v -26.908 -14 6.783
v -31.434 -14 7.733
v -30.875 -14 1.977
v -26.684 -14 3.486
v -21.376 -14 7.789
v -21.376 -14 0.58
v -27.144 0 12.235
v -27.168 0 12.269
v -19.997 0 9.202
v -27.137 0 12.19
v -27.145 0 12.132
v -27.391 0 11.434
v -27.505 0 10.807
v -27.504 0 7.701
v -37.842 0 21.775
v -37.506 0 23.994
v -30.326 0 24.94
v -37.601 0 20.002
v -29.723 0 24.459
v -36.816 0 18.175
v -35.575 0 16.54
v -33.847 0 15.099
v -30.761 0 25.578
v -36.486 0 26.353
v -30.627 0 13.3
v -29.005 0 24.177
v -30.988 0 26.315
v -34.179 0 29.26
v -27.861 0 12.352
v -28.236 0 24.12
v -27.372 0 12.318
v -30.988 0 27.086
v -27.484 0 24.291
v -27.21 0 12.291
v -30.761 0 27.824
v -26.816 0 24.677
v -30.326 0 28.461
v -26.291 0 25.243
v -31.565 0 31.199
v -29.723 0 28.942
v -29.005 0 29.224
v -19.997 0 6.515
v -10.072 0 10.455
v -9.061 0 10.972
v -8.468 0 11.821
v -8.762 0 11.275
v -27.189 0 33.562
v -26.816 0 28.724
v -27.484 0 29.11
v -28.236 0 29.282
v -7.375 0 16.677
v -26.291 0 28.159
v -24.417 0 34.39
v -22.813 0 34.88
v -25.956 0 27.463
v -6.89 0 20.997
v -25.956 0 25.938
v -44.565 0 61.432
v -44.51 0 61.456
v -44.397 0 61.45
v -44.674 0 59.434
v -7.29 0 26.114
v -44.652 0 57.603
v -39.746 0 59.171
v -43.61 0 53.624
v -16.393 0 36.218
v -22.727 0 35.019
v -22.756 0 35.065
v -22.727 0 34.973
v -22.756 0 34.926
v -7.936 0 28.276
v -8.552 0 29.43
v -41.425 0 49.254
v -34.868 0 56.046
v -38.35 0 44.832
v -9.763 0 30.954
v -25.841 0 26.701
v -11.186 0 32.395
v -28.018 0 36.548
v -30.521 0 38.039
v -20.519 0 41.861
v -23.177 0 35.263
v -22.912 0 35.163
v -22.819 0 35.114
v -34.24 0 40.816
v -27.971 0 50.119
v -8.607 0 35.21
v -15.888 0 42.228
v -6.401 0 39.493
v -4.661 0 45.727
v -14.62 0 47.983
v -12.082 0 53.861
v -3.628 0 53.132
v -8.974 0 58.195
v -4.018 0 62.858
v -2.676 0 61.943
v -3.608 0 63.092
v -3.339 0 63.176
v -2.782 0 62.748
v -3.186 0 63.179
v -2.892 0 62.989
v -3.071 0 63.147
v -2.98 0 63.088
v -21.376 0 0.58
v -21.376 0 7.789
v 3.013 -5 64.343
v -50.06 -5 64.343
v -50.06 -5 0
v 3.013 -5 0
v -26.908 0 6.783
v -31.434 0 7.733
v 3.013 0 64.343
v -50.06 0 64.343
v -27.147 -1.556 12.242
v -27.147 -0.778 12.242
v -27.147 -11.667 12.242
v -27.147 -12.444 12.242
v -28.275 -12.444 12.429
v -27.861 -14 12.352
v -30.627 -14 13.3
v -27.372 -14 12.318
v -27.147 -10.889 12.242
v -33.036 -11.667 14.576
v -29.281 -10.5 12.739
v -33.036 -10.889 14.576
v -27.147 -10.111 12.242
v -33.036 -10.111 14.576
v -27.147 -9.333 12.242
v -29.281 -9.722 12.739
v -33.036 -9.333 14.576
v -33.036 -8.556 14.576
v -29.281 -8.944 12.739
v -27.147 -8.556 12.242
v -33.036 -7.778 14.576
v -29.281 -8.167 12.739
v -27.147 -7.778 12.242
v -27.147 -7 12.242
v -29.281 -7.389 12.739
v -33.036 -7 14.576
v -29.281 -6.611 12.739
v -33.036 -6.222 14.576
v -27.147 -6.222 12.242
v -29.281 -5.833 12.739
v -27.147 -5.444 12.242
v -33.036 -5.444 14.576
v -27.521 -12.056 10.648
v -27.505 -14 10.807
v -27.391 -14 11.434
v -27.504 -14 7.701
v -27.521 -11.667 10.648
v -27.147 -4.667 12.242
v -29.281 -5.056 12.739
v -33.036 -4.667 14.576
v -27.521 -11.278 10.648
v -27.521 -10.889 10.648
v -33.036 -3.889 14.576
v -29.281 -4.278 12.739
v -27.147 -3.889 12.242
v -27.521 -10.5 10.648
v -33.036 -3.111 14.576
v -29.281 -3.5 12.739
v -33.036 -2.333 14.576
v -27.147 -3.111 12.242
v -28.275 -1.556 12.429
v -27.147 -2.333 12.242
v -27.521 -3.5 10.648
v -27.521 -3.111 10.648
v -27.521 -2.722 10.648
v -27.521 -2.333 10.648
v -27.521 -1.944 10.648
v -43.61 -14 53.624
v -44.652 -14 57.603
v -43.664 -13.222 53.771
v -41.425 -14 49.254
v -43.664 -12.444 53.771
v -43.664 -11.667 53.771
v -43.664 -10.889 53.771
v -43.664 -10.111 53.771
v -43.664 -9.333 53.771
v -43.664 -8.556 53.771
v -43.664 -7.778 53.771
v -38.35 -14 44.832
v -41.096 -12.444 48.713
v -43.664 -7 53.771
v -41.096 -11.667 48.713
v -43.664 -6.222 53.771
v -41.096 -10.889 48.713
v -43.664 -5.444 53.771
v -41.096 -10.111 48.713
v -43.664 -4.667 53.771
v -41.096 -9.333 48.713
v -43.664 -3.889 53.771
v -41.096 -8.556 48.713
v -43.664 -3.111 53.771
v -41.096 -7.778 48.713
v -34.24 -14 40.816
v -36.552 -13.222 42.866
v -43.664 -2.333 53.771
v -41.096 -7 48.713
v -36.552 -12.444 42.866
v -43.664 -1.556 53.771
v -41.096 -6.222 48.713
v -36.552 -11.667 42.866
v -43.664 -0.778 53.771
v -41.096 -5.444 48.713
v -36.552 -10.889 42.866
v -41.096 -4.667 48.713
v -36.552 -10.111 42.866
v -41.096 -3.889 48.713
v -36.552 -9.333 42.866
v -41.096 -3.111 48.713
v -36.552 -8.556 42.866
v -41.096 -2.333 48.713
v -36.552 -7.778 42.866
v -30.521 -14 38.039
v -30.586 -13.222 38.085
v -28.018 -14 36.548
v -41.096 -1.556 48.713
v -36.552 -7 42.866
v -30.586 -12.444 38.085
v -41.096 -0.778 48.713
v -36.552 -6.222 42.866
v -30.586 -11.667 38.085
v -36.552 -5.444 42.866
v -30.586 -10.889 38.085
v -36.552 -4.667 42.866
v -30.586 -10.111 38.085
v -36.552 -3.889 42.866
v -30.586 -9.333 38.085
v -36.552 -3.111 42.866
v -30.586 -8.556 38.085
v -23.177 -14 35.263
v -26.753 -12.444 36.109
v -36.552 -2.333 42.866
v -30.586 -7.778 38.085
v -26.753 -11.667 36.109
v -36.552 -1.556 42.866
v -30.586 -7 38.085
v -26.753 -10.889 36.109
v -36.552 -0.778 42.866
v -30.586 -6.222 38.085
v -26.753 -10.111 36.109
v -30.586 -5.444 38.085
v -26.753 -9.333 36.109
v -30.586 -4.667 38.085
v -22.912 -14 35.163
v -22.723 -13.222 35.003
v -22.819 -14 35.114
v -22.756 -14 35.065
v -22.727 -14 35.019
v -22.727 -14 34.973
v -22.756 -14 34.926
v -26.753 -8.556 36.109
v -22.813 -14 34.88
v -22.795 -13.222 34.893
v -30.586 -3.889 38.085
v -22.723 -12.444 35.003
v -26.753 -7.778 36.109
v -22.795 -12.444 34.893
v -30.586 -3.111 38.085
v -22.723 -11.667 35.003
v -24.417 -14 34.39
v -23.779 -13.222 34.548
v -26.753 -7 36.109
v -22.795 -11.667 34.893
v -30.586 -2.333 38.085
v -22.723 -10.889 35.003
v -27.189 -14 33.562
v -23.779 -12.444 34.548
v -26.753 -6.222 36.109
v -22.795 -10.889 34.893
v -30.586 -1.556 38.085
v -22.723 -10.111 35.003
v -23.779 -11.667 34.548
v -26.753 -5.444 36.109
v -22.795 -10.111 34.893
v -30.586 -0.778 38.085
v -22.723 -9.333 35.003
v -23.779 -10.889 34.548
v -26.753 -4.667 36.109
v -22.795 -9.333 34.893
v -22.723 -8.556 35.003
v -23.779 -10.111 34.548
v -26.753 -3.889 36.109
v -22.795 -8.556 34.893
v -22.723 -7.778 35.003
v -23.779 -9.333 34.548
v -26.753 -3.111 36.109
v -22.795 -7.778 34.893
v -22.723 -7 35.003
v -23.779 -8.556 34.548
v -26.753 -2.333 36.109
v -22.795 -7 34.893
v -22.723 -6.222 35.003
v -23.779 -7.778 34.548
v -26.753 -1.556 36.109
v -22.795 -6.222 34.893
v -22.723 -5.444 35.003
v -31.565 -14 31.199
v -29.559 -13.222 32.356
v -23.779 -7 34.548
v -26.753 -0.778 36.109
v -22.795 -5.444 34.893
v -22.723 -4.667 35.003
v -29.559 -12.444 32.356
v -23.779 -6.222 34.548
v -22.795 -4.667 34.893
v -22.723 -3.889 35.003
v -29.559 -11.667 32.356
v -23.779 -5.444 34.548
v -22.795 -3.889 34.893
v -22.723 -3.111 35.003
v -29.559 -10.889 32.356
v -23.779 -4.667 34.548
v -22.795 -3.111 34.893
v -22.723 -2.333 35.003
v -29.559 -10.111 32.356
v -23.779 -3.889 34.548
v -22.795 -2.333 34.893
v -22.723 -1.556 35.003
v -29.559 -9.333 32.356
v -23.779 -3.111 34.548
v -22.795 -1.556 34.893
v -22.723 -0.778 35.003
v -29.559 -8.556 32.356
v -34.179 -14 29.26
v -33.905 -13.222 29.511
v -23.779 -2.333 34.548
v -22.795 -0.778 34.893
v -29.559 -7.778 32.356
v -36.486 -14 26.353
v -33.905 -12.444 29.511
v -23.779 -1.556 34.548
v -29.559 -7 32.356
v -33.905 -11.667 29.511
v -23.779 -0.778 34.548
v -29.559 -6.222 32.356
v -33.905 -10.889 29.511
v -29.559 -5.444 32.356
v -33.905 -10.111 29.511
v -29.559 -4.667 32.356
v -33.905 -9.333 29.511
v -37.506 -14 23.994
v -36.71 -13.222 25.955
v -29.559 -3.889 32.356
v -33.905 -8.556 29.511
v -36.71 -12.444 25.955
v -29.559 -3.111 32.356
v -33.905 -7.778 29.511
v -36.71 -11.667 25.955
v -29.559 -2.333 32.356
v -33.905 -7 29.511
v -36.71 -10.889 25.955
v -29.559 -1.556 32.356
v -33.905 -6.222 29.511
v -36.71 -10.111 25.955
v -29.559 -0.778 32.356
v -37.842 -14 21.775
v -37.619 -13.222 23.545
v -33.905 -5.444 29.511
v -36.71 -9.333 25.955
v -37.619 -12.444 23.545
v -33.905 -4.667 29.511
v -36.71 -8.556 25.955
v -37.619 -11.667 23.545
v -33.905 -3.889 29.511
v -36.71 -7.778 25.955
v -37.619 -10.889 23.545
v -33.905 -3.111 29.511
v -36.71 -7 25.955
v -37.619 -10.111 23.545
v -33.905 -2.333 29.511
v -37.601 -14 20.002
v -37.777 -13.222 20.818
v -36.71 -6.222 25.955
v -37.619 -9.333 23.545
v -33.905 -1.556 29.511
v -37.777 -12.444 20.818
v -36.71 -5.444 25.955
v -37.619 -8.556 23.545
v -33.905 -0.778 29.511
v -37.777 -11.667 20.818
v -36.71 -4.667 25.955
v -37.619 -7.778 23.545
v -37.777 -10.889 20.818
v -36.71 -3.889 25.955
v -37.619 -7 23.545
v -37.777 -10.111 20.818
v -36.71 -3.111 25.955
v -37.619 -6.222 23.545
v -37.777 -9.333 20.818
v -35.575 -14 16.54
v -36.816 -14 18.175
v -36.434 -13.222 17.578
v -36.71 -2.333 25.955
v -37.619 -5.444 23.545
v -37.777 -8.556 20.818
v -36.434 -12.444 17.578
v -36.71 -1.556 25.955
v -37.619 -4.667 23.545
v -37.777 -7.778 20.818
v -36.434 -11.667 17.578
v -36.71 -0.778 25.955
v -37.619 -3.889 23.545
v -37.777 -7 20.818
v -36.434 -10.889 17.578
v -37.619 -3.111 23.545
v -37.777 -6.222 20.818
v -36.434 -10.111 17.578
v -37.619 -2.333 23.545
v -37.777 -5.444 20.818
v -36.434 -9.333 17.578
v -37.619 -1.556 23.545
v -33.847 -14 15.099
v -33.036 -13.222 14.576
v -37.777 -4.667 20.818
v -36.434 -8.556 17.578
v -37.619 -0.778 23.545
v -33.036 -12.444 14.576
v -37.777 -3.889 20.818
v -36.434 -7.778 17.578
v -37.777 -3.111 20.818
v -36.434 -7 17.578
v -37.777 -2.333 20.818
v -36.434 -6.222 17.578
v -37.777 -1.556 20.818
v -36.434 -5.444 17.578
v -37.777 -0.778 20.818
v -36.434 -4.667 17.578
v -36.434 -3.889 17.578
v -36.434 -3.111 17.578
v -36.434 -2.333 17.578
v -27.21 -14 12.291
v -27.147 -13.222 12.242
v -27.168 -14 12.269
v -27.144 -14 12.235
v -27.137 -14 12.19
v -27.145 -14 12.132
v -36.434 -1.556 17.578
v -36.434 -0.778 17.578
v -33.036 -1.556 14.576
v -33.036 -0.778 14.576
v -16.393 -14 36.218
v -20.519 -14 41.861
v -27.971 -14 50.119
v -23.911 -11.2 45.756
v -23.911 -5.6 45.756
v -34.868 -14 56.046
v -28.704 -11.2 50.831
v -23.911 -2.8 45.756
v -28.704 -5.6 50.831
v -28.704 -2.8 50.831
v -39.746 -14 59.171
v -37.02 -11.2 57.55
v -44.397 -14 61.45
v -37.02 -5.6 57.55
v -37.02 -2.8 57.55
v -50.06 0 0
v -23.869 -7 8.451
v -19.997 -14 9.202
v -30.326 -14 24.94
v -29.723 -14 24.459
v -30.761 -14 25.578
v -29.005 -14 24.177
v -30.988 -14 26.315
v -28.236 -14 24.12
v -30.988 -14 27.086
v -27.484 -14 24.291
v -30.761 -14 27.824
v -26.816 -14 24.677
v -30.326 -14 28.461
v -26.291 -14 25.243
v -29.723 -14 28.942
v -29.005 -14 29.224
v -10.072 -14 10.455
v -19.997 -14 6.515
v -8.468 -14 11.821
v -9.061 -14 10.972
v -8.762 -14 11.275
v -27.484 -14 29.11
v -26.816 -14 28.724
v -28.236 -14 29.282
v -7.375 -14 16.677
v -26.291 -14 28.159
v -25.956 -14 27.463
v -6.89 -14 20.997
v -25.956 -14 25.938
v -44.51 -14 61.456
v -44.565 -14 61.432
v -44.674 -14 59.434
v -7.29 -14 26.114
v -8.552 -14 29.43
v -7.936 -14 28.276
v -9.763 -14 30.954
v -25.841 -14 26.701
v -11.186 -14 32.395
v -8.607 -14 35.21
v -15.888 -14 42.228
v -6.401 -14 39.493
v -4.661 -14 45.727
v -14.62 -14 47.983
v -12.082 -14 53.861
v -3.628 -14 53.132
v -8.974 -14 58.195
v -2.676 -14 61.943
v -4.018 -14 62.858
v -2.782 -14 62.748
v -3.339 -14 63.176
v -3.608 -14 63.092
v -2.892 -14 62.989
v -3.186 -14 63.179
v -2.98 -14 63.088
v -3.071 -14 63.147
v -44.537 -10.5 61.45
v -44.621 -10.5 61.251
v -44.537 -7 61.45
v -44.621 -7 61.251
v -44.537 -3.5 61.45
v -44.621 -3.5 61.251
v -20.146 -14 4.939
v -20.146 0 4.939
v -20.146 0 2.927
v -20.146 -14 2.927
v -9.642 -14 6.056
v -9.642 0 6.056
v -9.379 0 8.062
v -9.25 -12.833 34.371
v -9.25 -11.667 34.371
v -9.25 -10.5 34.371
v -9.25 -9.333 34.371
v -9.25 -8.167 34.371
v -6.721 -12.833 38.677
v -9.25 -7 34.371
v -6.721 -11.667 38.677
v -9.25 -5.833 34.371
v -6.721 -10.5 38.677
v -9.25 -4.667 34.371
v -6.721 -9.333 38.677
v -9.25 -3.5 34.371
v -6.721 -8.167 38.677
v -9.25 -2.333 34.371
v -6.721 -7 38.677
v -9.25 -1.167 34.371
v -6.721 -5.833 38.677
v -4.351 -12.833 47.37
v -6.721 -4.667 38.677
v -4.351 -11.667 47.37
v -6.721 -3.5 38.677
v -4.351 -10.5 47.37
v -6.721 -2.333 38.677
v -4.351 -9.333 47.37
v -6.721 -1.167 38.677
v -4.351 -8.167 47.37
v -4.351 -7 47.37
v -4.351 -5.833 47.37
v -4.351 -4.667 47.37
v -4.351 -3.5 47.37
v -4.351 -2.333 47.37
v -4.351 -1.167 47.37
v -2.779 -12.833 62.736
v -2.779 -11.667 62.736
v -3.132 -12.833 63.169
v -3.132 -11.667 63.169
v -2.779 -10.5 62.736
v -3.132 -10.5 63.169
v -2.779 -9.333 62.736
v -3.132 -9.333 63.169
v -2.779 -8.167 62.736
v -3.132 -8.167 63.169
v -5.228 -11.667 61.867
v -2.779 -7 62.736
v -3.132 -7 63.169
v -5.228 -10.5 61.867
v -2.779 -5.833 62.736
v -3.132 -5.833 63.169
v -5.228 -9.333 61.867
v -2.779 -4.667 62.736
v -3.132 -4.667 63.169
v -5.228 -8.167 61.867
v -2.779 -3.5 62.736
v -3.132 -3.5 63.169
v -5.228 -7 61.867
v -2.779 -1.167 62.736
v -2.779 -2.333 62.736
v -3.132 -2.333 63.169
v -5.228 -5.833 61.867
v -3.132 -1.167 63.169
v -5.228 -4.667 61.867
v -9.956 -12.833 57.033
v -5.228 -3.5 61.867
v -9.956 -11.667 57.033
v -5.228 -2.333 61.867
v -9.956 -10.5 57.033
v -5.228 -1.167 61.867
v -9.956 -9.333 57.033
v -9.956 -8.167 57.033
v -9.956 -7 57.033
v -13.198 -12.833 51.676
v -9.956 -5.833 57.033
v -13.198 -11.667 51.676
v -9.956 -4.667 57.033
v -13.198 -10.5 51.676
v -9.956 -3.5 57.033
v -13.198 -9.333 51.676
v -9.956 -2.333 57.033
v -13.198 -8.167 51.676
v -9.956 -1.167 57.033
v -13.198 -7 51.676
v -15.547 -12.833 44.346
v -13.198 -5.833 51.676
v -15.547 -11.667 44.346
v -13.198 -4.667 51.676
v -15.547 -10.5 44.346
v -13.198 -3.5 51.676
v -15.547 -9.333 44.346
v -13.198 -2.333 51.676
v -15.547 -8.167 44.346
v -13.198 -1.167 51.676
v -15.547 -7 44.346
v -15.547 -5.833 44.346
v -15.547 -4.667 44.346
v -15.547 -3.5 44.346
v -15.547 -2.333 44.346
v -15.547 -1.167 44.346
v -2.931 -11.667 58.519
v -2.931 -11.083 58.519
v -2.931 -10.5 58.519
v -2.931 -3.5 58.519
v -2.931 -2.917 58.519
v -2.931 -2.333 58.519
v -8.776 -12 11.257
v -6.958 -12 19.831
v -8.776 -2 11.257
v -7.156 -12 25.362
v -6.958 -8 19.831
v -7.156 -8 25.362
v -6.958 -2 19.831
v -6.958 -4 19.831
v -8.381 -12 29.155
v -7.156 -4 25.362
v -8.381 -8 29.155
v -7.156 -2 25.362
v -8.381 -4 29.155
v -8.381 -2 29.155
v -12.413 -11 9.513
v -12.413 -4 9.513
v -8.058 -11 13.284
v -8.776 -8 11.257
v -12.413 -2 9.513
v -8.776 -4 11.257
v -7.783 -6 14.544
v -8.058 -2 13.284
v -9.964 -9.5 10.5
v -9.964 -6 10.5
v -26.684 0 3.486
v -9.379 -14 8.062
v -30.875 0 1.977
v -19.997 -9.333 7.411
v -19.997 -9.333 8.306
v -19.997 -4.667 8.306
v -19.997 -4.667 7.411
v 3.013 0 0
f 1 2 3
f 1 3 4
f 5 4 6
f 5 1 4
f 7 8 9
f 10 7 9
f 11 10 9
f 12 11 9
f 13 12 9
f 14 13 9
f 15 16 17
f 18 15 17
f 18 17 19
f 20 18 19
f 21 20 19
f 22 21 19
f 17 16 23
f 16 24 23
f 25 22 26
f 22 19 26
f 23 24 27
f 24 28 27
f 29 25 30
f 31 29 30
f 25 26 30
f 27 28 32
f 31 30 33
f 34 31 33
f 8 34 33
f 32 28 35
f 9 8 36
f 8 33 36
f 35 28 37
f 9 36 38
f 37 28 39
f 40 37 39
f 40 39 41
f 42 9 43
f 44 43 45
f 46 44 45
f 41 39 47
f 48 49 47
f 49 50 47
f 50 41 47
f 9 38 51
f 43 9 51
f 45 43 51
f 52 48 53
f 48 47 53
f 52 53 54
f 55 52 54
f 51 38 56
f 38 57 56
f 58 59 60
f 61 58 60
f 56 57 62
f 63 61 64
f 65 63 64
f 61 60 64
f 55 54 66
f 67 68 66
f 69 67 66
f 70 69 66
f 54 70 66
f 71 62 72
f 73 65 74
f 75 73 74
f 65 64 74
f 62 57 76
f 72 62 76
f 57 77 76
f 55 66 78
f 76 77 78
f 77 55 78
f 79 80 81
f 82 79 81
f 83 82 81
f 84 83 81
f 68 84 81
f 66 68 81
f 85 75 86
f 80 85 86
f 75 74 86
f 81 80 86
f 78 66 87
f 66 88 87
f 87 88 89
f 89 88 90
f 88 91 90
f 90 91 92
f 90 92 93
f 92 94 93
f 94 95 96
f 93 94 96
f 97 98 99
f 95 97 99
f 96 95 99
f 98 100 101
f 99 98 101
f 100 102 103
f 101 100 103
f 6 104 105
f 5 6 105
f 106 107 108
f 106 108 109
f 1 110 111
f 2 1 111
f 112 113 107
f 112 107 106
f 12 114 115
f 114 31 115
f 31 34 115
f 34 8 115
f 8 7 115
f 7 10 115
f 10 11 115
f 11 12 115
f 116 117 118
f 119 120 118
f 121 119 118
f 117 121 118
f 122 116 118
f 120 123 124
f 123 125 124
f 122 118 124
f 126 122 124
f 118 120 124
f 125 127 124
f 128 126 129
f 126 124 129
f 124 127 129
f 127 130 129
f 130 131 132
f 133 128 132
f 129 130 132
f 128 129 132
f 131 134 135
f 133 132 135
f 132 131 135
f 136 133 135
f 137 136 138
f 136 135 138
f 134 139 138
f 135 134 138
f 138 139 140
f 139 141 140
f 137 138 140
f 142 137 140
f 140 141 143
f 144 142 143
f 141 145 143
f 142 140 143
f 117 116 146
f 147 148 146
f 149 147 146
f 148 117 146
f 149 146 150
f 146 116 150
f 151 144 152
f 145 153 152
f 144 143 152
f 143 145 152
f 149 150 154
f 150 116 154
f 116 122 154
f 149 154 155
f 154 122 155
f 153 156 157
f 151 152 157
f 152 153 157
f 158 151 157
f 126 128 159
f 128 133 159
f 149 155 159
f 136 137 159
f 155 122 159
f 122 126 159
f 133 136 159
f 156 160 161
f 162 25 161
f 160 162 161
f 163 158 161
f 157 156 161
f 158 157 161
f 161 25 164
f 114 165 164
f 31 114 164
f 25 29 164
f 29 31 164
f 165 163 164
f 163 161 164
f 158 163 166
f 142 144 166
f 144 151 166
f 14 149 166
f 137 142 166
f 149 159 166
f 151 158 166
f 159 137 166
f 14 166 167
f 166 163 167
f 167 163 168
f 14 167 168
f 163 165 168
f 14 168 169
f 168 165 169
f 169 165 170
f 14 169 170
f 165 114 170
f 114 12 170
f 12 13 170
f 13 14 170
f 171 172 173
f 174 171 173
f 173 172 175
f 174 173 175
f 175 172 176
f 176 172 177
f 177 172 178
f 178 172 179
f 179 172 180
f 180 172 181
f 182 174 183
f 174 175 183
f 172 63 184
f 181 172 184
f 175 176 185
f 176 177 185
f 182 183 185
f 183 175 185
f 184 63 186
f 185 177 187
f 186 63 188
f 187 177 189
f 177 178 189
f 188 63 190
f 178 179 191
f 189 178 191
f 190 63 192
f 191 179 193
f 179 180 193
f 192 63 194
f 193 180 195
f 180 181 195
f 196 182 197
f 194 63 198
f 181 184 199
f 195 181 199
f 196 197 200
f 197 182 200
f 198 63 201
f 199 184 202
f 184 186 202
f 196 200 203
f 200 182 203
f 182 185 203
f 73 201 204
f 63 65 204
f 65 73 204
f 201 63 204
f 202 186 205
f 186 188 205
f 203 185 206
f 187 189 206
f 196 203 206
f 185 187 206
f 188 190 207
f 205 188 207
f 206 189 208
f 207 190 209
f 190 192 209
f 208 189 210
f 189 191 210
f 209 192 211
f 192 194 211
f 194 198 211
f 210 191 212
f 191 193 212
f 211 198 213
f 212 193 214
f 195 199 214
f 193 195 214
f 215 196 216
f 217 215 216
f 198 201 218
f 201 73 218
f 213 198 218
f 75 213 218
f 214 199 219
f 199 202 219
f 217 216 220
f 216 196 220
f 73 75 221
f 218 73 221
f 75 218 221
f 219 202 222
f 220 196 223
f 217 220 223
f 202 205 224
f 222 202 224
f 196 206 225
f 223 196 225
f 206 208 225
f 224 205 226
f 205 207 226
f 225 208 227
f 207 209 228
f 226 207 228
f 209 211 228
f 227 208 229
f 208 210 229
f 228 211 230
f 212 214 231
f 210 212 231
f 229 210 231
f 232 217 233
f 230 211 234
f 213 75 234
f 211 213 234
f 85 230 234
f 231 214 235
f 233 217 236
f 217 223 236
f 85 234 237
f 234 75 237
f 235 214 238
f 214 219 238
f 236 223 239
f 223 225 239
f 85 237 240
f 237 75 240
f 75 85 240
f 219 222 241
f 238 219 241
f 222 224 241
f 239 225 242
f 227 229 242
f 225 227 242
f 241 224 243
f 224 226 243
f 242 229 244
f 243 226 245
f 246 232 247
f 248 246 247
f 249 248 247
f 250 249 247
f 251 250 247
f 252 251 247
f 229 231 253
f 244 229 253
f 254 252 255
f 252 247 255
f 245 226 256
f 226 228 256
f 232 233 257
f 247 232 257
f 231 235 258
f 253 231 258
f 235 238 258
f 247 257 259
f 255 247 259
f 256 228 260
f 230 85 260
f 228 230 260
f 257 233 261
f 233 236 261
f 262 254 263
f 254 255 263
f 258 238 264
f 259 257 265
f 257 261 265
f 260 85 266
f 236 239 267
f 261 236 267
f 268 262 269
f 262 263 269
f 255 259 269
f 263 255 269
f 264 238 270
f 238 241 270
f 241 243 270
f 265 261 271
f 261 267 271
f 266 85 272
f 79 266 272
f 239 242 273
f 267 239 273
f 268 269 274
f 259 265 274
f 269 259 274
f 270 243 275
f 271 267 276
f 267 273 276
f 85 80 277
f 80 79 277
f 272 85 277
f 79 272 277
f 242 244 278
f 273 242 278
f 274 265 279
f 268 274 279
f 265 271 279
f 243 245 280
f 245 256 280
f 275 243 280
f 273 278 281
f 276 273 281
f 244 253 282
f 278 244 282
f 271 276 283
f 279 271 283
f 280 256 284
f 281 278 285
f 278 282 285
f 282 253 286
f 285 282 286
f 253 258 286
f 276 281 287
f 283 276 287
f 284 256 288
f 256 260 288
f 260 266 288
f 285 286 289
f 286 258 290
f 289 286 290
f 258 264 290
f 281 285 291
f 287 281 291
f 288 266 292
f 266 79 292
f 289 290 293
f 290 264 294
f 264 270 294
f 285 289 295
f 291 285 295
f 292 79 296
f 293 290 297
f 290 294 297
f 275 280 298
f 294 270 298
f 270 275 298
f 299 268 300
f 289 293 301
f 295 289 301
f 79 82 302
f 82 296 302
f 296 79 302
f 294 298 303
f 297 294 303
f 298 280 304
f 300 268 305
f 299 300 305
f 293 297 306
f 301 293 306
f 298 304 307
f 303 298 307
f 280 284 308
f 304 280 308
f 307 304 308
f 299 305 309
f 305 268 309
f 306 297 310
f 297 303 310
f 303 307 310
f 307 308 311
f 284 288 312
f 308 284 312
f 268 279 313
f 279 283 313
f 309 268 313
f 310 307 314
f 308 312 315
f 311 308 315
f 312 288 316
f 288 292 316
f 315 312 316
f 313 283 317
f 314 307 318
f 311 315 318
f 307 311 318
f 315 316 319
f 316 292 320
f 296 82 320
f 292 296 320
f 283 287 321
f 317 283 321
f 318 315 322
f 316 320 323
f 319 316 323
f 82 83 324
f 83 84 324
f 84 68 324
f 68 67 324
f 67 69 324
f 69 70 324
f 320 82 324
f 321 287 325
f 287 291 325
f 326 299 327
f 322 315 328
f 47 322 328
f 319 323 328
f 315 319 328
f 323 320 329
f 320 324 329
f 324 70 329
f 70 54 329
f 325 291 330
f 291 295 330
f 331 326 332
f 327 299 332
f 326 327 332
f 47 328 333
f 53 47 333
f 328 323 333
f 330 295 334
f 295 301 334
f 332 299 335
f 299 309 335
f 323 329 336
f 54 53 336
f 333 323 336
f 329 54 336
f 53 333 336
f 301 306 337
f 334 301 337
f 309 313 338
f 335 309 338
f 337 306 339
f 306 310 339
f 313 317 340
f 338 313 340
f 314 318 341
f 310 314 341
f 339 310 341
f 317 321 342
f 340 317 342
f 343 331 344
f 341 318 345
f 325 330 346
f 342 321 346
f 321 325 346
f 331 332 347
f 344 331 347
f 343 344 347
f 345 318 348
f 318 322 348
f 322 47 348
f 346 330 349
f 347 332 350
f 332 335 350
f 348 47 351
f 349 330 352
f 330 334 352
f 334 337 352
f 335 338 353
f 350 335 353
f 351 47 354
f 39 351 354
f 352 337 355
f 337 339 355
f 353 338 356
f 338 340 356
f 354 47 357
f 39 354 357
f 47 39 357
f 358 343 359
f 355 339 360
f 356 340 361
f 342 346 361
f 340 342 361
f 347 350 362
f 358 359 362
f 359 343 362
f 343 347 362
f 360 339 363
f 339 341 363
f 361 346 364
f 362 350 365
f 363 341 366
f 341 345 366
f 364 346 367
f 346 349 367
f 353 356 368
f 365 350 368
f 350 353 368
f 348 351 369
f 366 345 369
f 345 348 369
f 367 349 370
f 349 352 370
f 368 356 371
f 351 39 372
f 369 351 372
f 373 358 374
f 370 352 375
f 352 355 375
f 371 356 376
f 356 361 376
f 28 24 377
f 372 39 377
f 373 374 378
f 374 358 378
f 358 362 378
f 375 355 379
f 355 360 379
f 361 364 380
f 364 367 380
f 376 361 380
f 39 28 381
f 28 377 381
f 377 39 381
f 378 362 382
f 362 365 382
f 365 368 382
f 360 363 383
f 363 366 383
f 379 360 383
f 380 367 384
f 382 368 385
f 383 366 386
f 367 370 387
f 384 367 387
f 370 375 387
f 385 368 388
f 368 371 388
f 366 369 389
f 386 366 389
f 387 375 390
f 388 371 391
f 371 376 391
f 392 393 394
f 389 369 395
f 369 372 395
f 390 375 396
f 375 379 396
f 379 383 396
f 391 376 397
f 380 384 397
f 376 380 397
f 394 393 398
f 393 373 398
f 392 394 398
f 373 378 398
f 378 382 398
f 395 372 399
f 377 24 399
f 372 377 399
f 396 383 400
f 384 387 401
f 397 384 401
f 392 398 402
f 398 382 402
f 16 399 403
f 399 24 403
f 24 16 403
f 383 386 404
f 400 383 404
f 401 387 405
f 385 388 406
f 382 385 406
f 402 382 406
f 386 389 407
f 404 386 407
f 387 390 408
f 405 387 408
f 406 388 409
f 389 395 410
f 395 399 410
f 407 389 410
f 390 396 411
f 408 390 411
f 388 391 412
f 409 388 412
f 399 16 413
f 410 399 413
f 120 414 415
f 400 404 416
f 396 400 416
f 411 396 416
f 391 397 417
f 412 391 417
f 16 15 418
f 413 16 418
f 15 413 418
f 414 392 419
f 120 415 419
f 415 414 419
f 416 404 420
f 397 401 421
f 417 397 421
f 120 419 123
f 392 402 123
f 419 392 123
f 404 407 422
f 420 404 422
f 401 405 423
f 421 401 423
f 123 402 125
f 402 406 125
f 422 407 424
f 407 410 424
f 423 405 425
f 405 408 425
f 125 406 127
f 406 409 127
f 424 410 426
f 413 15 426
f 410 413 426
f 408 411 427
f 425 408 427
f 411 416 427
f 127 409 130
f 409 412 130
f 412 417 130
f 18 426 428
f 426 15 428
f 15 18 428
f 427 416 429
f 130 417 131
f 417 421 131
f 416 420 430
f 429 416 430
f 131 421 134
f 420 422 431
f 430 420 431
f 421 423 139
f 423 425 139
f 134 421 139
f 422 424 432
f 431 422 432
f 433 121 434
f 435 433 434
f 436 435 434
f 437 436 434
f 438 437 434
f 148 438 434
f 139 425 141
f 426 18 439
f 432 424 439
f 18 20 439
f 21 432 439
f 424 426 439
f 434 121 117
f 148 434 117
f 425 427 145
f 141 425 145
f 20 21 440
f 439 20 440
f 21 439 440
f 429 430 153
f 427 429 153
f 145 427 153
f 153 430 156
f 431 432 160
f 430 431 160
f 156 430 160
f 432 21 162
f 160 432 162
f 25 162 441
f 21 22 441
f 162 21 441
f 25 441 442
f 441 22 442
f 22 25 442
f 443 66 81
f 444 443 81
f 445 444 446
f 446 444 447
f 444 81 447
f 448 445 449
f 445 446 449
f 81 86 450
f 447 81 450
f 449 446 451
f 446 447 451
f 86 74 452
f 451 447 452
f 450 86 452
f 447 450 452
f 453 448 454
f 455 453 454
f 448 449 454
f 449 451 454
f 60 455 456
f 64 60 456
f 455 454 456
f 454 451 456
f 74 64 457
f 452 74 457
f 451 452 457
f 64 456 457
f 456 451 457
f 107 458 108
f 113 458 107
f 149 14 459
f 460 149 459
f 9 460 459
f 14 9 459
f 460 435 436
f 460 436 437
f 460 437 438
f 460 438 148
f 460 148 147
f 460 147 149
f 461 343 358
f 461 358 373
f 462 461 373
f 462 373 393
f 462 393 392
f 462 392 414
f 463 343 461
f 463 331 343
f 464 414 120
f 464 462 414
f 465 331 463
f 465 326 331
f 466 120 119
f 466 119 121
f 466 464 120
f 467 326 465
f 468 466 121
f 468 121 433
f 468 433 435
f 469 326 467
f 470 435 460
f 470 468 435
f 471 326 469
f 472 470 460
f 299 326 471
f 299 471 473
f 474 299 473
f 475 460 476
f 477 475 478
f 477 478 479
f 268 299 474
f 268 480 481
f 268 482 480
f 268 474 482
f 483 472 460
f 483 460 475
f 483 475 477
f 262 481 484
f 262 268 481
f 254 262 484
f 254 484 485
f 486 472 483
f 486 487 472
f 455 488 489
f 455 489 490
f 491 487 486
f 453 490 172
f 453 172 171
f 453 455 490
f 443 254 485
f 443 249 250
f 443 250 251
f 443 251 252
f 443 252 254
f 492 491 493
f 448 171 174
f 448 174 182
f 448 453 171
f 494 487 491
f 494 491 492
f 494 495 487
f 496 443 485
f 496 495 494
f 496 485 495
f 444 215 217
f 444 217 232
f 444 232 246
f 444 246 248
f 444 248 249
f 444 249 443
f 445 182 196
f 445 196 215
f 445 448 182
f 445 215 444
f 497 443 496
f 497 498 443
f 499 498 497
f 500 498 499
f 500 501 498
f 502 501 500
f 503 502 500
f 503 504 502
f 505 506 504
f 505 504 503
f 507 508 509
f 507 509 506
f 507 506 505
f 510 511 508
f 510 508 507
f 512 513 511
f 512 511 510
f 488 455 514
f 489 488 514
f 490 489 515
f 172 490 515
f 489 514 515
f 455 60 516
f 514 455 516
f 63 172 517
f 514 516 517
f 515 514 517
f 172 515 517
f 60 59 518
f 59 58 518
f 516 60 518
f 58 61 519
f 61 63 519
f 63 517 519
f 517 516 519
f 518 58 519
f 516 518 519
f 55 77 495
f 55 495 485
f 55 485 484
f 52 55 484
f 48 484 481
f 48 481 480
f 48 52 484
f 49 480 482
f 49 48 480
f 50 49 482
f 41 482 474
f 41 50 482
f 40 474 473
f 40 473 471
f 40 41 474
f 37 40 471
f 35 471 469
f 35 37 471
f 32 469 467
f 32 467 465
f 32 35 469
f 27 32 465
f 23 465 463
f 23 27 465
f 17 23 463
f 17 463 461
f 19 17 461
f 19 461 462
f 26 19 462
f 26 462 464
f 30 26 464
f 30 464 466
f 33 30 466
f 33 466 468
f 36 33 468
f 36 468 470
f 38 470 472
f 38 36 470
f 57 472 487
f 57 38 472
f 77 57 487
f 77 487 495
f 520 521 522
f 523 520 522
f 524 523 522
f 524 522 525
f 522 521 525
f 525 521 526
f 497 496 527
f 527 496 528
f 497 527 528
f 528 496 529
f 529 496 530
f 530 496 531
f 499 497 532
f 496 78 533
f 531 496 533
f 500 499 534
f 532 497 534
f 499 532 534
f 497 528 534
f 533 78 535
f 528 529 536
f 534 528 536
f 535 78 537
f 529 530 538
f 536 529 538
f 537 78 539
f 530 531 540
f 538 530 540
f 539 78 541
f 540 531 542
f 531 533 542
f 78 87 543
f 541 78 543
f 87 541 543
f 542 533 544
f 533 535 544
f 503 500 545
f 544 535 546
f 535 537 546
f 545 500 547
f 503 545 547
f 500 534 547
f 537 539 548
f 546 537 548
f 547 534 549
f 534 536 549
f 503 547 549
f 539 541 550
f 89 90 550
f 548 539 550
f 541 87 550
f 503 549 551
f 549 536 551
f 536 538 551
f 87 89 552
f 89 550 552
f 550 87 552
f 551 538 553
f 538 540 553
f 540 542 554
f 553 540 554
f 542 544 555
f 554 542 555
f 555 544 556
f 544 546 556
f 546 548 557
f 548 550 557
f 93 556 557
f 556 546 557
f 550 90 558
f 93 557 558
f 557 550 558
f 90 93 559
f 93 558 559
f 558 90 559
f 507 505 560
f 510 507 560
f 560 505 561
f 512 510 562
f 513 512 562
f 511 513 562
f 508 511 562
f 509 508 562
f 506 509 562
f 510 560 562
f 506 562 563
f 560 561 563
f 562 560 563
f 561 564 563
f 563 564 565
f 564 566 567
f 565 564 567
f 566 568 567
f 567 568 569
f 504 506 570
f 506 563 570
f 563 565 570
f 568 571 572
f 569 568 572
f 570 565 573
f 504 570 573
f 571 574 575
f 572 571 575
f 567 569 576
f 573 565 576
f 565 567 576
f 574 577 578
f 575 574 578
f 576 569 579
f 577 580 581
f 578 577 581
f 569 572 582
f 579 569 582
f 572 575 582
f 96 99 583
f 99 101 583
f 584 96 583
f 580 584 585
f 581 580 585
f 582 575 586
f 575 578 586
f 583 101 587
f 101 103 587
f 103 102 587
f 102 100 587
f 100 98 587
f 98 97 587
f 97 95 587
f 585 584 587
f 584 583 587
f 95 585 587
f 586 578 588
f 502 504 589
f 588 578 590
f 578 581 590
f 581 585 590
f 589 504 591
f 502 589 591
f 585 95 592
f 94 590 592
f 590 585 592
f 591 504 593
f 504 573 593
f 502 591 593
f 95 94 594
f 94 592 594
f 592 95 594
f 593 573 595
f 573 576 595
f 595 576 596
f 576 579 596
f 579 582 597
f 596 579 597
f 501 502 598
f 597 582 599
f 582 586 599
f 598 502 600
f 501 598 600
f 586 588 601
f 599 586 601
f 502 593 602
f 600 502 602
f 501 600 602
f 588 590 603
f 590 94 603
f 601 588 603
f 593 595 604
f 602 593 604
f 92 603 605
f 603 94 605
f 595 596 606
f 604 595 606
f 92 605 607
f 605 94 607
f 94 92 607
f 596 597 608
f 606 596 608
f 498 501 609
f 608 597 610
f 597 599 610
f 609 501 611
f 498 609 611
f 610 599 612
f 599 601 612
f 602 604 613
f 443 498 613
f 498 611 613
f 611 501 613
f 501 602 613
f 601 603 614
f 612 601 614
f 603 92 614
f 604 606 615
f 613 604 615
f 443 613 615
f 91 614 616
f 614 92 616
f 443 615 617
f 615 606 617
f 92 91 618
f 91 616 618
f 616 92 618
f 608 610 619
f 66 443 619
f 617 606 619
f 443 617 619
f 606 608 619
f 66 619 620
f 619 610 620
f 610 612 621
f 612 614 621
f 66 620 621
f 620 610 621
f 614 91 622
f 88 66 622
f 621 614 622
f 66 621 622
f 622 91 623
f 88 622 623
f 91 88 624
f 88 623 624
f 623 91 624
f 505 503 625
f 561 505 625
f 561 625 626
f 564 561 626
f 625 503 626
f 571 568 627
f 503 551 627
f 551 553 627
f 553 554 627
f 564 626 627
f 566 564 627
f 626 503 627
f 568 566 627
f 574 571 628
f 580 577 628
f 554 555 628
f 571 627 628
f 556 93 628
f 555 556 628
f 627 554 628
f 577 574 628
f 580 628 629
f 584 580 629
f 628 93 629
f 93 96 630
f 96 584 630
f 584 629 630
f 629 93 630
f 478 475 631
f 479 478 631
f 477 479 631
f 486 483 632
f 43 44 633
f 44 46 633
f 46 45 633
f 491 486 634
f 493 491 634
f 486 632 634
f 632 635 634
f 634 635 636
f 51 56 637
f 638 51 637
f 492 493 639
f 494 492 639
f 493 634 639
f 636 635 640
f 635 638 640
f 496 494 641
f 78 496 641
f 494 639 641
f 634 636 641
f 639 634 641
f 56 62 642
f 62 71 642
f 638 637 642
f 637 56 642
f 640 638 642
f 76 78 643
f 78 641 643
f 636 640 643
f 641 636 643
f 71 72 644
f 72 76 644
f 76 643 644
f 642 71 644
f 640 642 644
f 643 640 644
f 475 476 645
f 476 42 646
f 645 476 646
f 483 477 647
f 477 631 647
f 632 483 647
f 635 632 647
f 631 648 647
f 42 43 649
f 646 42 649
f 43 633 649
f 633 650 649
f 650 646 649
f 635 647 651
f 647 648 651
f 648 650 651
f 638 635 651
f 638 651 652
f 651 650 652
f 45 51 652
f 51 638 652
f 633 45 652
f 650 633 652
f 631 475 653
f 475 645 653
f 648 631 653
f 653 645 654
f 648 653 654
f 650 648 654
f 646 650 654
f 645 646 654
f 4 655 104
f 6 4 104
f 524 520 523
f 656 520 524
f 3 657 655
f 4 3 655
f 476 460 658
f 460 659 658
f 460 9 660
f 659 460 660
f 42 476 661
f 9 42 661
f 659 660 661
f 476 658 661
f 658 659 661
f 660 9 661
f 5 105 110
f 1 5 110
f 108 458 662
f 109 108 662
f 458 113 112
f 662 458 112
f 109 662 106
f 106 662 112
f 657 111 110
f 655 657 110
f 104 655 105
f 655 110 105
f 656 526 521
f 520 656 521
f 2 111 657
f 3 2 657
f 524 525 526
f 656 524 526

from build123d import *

# Parameters (mm, degrees)
F0_R     = 2.5881190518
F1_DEPTH = 14
F2_W     = 53.0733359046
F2_H     = 64.3425136805
F3_DEPTH = 5


# Not quite as in the source:
# - a feature names something its author has since deleted; it is built from what else it names


with BuildPart() as f1:
    # F0 (on Front) → F1 (new body)
    with BuildSketch(Plane.XZ):
        with BuildLine():
            add(Edge.make_bspline(
                [(-44.3972833455, 61.4496953785), (-44.4490464675, 61.4568435425), (-44.565056792, 61.4728638439), (-44.681468286, 61.2009254932), (-44.6765757123, 58.4695911448), (-44.658618745, 57.8367841289), (-44.6519888937, 57.6031468809)],
                knots=[0, 0, 0, 0, 0.1083960468, 0.2429347395, 0.7204856463, 1, 1, 1, 1], degree=3))
            add(Edge.make_bspline(
                [(-44.6519888937, 57.6031468809), (-44.4003246793, 56.3541446109), (-43.8473826271, 53.6099090822), (-41.126808261, 48.4869449794), (-36.9683037207, 42.6682303212), (-30.5102740969, 37.9993132704), (-27.5245233409, 35.9740625461), (-20.6501644663, 35.0472789539), (-26.5215643921, 34.07988225), (-29.4570014209, 32.3971668125), (-34.1239486196, 29.8359159403), (-36.8205871097, 26.084209941), (-37.7045777644, 23.5983639301), (-38.0421931941, 20.7389531569), (-36.5846802801, 17.270299258), (-33.3696698148, 14.4627164238), (-28.2588031256, 12.1527927032), (-26.9118321529, 12.4074409024), (-27.6583389074, 11.2686028265), (-27.5666216616, 9.1459115136), (-27.5041740388, 7.7006323263)],
                knots=[0, 0, 0, 0, 0.0559294052, 0.1228848533, 0.1993895751, 0.2771236427, 0.3355004813, 0.3929729537, 0.4441332892, 0.5005835066, 0.5646576506, 0.6244890061, 0.669608993, 0.7160670006, 0.7687175891, 0.8285841882, 0.8948534111, 0.9199839904, 0.9455194108, 1, 1, 1, 1], degree=3))
            add(Edge.make_bspline(
                [(-27.5041740388, 7.7006323263), (-26.3024494279, 7.9527125617), (-23.8619408464, 8.4646468037), (-21.2983337476, 8.9537756253), (-19.9970658869, 9.2020537704)],
                knots=[0, 0, 0, 0, 0.4924074514, 1, 1, 1, 1], degree=3))
            add(Edge.make_bspline(
                [(-19.9970658869, 9.2020537704), (-19.9970658869, 8.3064689922), (-19.9970658869, 7.4108842139), (-19.9970658869, 6.5152994357)],
                knots=[0, 0, 0, 0, 2.6867543347, 2.6867543347, 2.6867543347, 2.6867543347], degree=3))
            add(Edge.make_bspline(
                [(-19.9970658869, 6.5152994357), (-16.0512076561, 8.0698825341), (-10.5172081741, 10.2501590564), (-8.5887342269, 11.0811763191), (-7.9460625464, 13.6378911094), (-6.6753789765, 19.9029977792), (-6.9843010939, 25.2696178352), (-8.0572100828, 29.3332570636), (-10.1306055922, 31.3622079575), (-11.1860912293, 32.3950685561)],
                knots=[0, 0, 0, 0, 0.2156238193, 0.3024087624, 0.4033101833, 0.5728250723, 0.7293840486, 0.8622398628, 1, 1, 1, 1], degree=3))
            add(Edge.make_bspline(
                [(-11.1860912293, 32.3950685561), (-10.5212378252, 33.0107248909), (-9.0471212528, 34.3801242718), (-6.3090018579, 38.6642251737), (-4.0541052944, 47.6794637923), (-3.679815117, 53.9321618248), (-2.2206591136, 62.6908933724), (-3.4427635635, 63.4443985763), (-5.3796876825, 61.7439260973), (-7.032660786, 60.2214249236), (-10.2555515002, 56.9987891103), (-13.4853950363, 51.7094244106), (-15.9017235257, 44.2992201365), (-16.2172110494, 39.0461386917), (-16.3931064308, 36.2177453935)],
                knots=[0, 0, 0, 0, 0.0625353907, 0.146564244, 0.2594282324, 0.3614765557, 0.4683826109, 0.5006173225, 0.5572565569, 0.6156302084, 0.694103097, 0.7881892855, 0.8925081532, 1, 1, 1, 1], degree=3))
            add(Edge.make_bspline(
                [(-16.3931064308, 36.2177453935), (-17.187345901, 37.4388284437), (-18.9834532323, 40.2002074745), (-24.0747269617, 45.9440130974), (-28.5123048659, 50.9302417978), (-36.8587882285, 57.9637418804), (-41.9903191322, 60.3366661613), (-44.3972833455, 61.4496953785)],
                knots=[0, 0, 0, 0, 0.1581257064, 0.3575882981, 0.5504459332, 0.7891349441, 1, 1, 1, 1], degree=3))
        make_face()
        with Locations((-28.4292511642, 26.7006196082)):
            Circle(F0_R, mode=Mode.SUBTRACT)
    extrude(amount=F1_DEPTH)


with BuildPart() as f1b:
    # F0 (on Front) → F1, piece 2 (new body)
    with BuildSketch(Plane.XZ):
        Polygon((-26.9076004624, 6.7828586325), (-31.4336456358, 7.7327694744), (-30.8748763055, 1.9774257671), (-26.6840923578, 3.4861082677), (-21.3757641613, 0.5804976099), (-21.3757641613, 7.7886469662), align=None)
    extrude(amount=F1_DEPTH)


with BuildPart() as f1c:
    # F0 (on Front) → F1, piece 3 (new body)
    with BuildSketch(Plane.XZ):
        Polygon((-9.3785477802, 8.0618355423), (-20.1464686543, 4.9389135092), (-20.1464686543, 2.9273370747), (-9.6415681764, 6.0564558953), align=None)
    extrude(amount=F1_DEPTH)


with BuildPart() as f3:
    # F2 (on Front) → F3 (new body)
    with BuildSketch(Plane.XZ):
        with Locations((-23.5232871491, 32.1712568402)):
            Rectangle(F2_W, F2_H)
    extrude(amount=F3_DEPTH)


solid = Compound([f1.part, f1b.part, f1c.part, f3.part])
